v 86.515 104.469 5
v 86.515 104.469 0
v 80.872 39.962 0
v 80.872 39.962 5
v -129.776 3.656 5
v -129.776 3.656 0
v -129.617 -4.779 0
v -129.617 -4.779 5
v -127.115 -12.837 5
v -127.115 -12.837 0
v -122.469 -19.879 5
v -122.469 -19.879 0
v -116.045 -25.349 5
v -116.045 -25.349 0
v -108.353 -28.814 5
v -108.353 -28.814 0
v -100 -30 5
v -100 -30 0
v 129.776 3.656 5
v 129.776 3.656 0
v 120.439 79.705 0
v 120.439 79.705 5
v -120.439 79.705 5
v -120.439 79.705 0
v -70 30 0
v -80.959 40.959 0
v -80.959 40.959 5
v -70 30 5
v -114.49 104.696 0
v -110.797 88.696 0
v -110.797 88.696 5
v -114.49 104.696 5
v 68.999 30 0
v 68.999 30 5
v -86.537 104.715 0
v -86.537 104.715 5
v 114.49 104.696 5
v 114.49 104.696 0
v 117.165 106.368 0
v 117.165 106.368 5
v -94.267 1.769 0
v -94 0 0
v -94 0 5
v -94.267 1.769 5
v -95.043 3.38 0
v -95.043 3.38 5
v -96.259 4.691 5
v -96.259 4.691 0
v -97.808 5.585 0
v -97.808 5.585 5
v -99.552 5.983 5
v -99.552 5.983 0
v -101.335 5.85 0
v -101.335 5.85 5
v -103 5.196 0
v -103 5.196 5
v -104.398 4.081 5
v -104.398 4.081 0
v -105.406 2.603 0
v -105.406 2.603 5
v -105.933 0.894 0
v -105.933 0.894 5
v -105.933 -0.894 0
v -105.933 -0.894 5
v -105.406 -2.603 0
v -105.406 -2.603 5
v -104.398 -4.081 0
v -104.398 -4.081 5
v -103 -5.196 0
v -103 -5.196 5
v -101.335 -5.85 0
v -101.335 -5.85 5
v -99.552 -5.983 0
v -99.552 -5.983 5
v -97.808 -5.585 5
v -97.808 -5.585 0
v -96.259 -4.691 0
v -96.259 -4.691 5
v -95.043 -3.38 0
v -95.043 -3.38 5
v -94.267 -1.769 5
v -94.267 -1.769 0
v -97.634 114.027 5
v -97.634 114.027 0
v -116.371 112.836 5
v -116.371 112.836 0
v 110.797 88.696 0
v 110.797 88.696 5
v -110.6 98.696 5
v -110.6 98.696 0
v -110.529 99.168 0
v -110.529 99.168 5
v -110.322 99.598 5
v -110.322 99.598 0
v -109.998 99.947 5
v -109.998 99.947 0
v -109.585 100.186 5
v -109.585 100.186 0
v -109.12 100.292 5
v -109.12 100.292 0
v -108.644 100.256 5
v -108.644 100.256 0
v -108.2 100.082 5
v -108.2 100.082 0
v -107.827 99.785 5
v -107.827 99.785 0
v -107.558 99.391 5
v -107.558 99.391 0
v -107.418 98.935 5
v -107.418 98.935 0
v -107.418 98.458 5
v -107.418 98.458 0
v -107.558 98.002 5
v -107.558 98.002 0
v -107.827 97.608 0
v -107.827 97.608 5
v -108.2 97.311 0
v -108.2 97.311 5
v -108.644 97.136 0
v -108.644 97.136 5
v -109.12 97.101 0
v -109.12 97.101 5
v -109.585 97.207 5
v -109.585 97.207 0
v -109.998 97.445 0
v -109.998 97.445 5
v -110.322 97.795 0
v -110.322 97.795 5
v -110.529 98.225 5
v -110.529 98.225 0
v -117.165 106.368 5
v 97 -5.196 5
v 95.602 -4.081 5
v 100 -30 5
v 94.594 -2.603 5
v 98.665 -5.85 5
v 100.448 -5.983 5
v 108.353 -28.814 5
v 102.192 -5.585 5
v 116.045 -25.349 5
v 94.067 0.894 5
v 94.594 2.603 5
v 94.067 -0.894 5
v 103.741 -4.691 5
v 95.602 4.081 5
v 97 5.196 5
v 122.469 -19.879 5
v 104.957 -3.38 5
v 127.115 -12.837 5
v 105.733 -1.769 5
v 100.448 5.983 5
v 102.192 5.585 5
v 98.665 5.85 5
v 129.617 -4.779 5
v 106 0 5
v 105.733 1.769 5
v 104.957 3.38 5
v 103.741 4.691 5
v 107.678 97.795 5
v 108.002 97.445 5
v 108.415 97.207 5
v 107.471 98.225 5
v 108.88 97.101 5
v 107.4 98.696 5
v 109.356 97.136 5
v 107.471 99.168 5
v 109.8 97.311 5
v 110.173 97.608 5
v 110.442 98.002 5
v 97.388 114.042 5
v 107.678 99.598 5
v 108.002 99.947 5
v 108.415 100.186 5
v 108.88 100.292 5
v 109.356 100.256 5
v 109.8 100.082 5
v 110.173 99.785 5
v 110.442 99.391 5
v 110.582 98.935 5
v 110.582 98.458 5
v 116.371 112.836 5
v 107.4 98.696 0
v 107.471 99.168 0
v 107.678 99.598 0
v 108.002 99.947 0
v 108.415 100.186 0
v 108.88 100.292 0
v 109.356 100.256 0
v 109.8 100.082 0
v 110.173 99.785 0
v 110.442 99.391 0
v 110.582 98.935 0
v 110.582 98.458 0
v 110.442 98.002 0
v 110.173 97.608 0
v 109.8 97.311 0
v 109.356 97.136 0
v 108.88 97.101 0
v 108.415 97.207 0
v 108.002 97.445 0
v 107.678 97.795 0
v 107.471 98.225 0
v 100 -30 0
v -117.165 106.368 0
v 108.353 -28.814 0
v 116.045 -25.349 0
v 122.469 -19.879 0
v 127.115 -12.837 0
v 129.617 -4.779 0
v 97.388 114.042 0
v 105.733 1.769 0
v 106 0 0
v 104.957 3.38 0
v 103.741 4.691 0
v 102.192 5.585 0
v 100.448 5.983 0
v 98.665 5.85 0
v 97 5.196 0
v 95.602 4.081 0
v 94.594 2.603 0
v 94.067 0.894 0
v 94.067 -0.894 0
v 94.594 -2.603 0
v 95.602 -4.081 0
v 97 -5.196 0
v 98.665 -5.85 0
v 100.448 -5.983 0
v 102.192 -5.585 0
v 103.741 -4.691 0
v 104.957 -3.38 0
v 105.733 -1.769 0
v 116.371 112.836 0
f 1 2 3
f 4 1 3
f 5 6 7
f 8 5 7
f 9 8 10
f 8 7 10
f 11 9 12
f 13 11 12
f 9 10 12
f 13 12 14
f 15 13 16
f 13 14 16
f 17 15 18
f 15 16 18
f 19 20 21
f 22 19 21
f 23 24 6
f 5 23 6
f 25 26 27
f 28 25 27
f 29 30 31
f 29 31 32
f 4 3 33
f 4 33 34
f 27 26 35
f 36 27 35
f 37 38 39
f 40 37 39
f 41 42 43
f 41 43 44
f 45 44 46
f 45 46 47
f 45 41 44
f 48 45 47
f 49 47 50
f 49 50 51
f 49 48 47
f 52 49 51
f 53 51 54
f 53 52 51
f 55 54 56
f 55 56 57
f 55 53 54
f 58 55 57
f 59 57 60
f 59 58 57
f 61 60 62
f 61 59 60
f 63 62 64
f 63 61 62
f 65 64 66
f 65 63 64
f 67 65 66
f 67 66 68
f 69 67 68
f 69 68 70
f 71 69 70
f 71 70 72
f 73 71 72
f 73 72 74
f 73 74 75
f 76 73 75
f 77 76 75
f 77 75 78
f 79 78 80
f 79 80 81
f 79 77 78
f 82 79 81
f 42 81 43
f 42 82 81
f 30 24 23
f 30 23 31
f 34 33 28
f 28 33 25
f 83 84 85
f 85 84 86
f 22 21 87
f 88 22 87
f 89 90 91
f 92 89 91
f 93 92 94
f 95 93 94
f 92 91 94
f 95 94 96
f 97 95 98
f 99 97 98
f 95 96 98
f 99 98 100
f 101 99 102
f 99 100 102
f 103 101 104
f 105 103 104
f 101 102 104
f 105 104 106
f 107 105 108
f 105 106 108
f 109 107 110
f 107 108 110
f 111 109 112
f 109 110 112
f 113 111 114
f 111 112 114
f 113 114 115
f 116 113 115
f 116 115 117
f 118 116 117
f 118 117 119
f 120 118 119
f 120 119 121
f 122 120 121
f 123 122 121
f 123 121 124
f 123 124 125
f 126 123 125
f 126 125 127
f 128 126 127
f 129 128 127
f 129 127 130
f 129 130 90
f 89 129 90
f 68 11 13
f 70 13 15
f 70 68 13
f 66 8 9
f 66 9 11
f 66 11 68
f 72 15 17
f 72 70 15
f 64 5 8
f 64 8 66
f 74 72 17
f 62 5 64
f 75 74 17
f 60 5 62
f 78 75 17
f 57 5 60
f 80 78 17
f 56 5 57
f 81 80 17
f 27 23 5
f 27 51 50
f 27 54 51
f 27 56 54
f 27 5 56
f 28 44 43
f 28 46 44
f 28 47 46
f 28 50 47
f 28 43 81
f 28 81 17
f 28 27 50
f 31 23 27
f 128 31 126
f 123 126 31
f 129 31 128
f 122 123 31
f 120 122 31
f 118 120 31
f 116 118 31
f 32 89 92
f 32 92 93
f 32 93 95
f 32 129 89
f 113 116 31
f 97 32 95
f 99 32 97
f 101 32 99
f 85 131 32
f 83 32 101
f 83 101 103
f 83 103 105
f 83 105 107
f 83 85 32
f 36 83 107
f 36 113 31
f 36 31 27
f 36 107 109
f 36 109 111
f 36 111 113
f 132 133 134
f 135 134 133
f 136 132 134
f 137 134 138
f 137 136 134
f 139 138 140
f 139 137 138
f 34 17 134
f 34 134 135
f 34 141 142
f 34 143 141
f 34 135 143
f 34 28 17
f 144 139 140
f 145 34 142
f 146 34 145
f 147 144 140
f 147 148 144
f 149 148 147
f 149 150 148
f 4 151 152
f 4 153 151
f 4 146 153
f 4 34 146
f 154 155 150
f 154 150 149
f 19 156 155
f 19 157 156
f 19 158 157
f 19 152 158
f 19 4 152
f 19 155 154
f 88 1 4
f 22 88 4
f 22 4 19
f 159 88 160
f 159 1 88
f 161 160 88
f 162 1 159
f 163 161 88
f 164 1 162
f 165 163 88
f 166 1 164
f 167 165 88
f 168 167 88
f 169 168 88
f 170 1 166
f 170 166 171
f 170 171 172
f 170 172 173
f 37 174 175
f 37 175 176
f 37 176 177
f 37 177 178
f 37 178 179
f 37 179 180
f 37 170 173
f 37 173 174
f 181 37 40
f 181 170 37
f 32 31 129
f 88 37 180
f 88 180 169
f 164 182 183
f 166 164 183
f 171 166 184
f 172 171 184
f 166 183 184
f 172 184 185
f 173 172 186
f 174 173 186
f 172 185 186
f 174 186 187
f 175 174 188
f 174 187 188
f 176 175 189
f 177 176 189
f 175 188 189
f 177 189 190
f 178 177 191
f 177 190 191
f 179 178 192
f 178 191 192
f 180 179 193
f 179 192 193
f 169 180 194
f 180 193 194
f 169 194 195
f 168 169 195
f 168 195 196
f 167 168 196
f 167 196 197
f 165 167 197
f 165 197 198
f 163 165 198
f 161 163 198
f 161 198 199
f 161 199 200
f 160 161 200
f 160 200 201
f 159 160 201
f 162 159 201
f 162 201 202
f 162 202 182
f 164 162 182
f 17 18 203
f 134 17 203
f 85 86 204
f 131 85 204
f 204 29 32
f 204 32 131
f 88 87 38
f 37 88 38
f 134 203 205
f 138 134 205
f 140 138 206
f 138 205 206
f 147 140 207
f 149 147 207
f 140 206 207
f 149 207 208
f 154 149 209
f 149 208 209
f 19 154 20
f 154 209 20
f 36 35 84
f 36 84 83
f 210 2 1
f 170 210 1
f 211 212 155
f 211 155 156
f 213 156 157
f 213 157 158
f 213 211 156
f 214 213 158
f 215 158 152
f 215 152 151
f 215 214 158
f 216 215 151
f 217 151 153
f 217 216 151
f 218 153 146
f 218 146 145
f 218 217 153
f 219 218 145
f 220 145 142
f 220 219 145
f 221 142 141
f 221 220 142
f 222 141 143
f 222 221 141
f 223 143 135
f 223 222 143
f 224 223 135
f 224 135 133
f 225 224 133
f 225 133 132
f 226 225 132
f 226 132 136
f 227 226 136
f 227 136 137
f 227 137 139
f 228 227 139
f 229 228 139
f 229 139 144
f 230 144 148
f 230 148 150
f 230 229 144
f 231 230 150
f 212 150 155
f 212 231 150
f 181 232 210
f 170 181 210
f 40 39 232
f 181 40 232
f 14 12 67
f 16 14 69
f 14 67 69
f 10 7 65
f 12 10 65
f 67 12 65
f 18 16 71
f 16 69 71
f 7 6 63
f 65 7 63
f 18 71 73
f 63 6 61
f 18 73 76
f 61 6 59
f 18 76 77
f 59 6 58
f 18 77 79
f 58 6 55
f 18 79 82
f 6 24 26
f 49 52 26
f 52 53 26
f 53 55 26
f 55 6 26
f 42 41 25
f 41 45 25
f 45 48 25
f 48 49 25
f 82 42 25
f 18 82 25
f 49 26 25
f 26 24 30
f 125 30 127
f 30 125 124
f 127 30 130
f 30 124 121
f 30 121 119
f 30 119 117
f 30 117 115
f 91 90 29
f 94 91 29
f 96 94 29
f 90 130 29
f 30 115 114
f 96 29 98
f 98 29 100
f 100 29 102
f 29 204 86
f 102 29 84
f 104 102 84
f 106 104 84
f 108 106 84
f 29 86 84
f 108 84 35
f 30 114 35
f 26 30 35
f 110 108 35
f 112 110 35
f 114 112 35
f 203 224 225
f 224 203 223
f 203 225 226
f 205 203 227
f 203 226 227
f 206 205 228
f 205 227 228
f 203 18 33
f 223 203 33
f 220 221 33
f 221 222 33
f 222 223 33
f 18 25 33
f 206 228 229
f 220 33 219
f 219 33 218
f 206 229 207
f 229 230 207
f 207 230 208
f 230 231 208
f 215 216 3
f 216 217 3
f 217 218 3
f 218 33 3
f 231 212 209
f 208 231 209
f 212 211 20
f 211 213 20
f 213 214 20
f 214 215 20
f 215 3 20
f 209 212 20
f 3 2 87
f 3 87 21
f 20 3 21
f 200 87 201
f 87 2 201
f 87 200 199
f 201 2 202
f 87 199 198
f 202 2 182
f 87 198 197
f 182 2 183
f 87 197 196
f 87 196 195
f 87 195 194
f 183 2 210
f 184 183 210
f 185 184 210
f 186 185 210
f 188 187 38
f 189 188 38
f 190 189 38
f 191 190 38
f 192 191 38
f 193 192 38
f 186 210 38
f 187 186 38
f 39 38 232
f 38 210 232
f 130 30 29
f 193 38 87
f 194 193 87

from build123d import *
from OCP.BRepFilletAPI import BRepFilletAPI_MakeChamfer

# Parameters (mm, degrees)
SKETCH1_R           = 6
BOSS_EXTRUDE1_DEPTH = 5
SKETCH2_R           = 1.6
CUT_EXTRUDE1_DEPTH  = 25
CHAMFER1_SIZE       = 10
CHAMFER1_SIZE2      = 10.246835966
CHAMFER2_SIZE       = 10
CHAMFER2_SIZE2      = 11.000628676


with BuildPart() as part:
    # Sketch1 → Boss-Extrude1 (new body)
    with BuildSketch(Plane.XY):
        with BuildLine():
            Line((80, 30), (-80, 30))
            Line((-80, 30), (-87.408238134, 114.676549338))
            Line((-87.408238134, 114.676549338), (-116.370756775, 112.836156983))
            Line((-116.370756775, 112.836156983), (-129.776384549, 3.656080302))
            ThreePointArc((-129.776384549, 3.656080302), (-122.468671624, -19.878601446), (-100, -30))
            Line((-100, -30), (100, -30))
            ThreePointArc((100, -30), (122.468671624, -19.878601446), (129.776384549, 3.656080302))
            Line((129.776384549, 3.656080302), (116.370756775, 112.836156983))
            Line((116.370756775, 112.836156983), (87.408238134, 114.676549338))
            Line((87.408238134, 114.676549338), (80, 30))
        make_face()
        with Locations((-100, 0)):
            Circle(SKETCH1_R, mode=Mode.SUBTRACT)
        with Locations((100, 0)):
            Circle(SKETCH1_R, mode=Mode.SUBTRACT)
    extrude(amount=BOSS_EXTRUDE1_DEPTH)

    # Sketch2 → Cut-Extrude1 (cut)
    with BuildSketch(Plane(origin=(0, 0, 0), x_dir=(-1, 0, 0), z_dir=(0, 0, -1))):
        with Locations((109, 98.696293654)):
            Circle(SKETCH2_R)
        with Locations((-109, 98.696293654)):
            Circle(SKETCH2_R)
        Polygon((120.438781703, 79.704752691), (110.79653452, 88.696293654), (114.490425578, 104.696293654), (117.165001342, 106.367554078), align=None)
        Polygon((-117.165001342, 106.367554078), (-120.438781703, 79.704752691), (-110.79653452, 88.696293654), (-114.490425578, 104.696293654), align=None)
    extrude(amount=-CUT_EXTRUDE1_DEPTH, mode=Mode.SUBTRACT)

    # Chamfer1: one chamfer whose edges measure the first distance from different faces: ONE call of the kernel's chamfer builder (chamfer() names one face for all edges)
    chamfer1_edges_1 = [part.edges().sort_by_distance(p)[0] for p in [
        (-87.408238134, 114.676549338, 2.5),
    ]]
    chamfer1_side_1 = [part.faces().sort_by_distance(p)[0] for p in [
        (-83.704119067, 72.338274669, 2.5),
    ]]
    chamfer1_edges_2 = [part.edges().sort_by_distance(p)[0] for p in [
        (87.408238134, 114.676549338, 2.5),
    ]]
    chamfer1_side_2 = [part.faces().sort_by_distance(p)[0] for p in [
        (101.889497454, 113.75635316, 2.5),
    ]]
    chamfer1 = BRepFilletAPI_MakeChamfer(part.part.solid().wrapped)
    for e in chamfer1_edges_1:
        chamfer1.Add(CHAMFER1_SIZE, CHAMFER1_SIZE2, e.wrapped, chamfer1_side_1[0].wrapped)  # the first distance lies on this face
    for e in chamfer1_edges_2:
        chamfer1.Add(CHAMFER1_SIZE, CHAMFER1_SIZE2, e.wrapped, chamfer1_side_2[0].wrapped)  # the first distance lies on this face
    add(Compound.cast(chamfer1.Shape()), mode=Mode.REPLACE)

    # Chamfer2: one chamfer whose edges measure the first distance from different faces: ONE call of the kernel's chamfer builder (chamfer() names one face for all edges)
    chamfer2_edges_1 = [part.edges().sort_by_distance(p)[0] for p in [
        (-80, 30, 2.5),
    ]]
    chamfer2_side_1 = [part.faces().sort_by_distance(p)[0] for p in [
        (0, 30, 2.5),
    ]]
    chamfer2_edges_2 = [part.edges().sort_by_distance(p)[0] for p in [
        (80, 30, 2.5),
    ]]
    chamfer2_side_2 = [part.faces().sort_by_distance(p)[0] for p in [
        (83.257583767, 67.234352838, 2.5),
    ]]
    chamfer2 = BRepFilletAPI_MakeChamfer(part.part.solid().wrapped)
    for e in chamfer2_edges_1:
        chamfer2.Add(CHAMFER2_SIZE, CHAMFER2_SIZE2, e.wrapped, chamfer2_side_1[0].wrapped)  # the first distance lies on this face
    for e in chamfer2_edges_2:
        chamfer2.Add(CHAMFER2_SIZE, CHAMFER2_SIZE2, e.wrapped, chamfer2_side_2[0].wrapped)  # the first distance lies on this face
    add(Compound.cast(chamfer2.Shape()), mode=Mode.REPLACE)


solid = part.part
